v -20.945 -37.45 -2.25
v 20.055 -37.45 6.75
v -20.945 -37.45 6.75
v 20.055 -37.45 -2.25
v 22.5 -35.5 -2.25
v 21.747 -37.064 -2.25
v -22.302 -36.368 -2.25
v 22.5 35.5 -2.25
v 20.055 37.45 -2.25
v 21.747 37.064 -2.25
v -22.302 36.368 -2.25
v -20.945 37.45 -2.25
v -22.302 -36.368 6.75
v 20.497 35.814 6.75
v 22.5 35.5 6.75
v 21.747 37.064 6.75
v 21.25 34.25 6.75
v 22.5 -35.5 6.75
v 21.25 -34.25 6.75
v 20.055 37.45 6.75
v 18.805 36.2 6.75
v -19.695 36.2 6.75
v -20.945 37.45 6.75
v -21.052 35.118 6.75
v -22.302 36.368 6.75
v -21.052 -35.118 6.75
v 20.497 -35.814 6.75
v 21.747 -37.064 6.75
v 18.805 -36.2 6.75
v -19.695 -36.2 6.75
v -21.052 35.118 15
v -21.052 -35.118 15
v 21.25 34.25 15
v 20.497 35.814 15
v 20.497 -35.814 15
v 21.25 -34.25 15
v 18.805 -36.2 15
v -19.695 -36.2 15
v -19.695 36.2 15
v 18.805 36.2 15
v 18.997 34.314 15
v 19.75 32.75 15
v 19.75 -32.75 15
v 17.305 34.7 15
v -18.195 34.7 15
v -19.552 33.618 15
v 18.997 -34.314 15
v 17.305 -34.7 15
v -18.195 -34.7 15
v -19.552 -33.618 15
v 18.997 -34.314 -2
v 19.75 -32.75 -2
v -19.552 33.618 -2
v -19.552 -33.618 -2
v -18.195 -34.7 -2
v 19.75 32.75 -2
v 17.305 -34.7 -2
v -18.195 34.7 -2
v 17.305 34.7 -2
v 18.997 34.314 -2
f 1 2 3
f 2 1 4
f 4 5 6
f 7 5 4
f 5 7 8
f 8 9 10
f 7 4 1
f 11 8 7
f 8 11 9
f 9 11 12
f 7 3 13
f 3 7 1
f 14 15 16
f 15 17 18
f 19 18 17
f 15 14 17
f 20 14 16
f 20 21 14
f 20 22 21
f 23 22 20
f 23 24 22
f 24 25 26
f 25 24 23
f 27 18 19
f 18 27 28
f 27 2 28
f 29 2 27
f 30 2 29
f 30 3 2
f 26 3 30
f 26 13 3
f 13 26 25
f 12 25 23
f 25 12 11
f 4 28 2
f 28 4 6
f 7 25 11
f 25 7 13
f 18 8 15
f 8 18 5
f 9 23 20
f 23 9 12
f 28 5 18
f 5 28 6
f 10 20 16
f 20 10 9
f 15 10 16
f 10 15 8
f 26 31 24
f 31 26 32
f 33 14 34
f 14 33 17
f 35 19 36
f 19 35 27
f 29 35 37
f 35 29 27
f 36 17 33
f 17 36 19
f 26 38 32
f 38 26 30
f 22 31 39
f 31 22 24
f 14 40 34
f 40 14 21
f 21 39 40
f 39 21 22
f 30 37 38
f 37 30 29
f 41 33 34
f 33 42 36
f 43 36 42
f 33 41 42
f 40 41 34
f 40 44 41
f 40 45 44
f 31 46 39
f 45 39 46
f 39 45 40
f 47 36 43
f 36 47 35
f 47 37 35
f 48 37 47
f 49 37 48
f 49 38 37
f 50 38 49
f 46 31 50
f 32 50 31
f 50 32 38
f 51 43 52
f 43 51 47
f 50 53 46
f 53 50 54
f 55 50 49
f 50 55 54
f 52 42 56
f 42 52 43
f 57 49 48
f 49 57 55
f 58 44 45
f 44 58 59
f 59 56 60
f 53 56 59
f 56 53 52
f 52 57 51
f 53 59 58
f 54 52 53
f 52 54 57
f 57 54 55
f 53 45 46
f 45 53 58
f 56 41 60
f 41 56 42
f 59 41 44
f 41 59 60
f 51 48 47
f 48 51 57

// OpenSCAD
// file: box_params.scad
//CUSTOMIZER VARIABLES

// Wall thickness in mm
thickness=2.5; // [1:10]
// in mm
x_width=45;

// in mm
y_width=75;

// in mm
height=18/2;


// Corner roundover in mm (0=sharp corner)
radius=2; // [0:50]

// Generate the box
do_box=1; // [0:no,1:yes]

// Generate a lid
do_lid=0; // [0:no,1:yes]

// height in mm
lid_thickness=6;

//CUSTOMIZER VARIABLES END

// Screw pilot hole size
screw_pilot=1.125*1;

// Screw hole size
screw_hole=2.5*1;

// Whether you want the screw countersunk
screw_countersink=0*1;

text="";
textSize=14;
textThickness=2;

// =============== calculated variables
lid_height=height/4+min(height/4,lid_thickness);
corner_radius=min(radius,x_width/2,y_width/2);
xadj=x_width-(corner_radius*2);
yadj=y_width-(corner_radius*2);
snugfit=0.5/2;
// main file
// http://www.thingiverse.com/thing:213934

// ================ variables
//use <write/Write.scad>
include <box_params.scad>;

// =============== program

// ---- The box
if(do_box==1) translate([-((x_width/2+1)*do_lid),0,0]) difference() {

union() {
minkowski() // main body
{
 cube([xadj,yadj,height-lid_height],center=true);
 cylinder(r=corner_radius,h=height-lid_height);
}

translate([0,0,(lid_height-thickness)*2]) minkowski() // main body overlap
{
 cube([xadj-thickness,yadj-thickness,height-(thickness*2)],center=true);
 cylinder(r=corner_radius,h=height);
}
}

translate([0,0,thickness*1]) minkowski() // inside area
{
 cube([xadj-((thickness+snugfit)*2),yadj-((thickness+snugfit)*2),height],center=true);
 cylinder(r=corner_radius,h=height);
}

};

// ---- The lid
if(do_lid==1) translate([(x_width/2+1)*do_box,0,lid_height/2]) {

#difference() {
	minkowski() // main body
	{
 		cube([xadj,yadj,lid_height],center=true);
 		cylinder(r=corner_radius,h=lid_height);
	}

	translate([0,0,thickness]) minkowski() // inside area
	{
 		cube([xadj-(thickness-snugfit),yadj-(thickness-snugfit),lid_height],center=true);
 		cylinder(r=corner_radius,h=lid_height);

	}
/*
   translate([0,0,-thickness+0.3])
   	writecube(text=text,
			  where=[y_width/2,
			  x_width/2-textSize/4,
			  lid_thickness],
			  size=[l,w,h],
			  face="top",
			  t=textThickness,
			  h=textSize);
*/
}


	

};
